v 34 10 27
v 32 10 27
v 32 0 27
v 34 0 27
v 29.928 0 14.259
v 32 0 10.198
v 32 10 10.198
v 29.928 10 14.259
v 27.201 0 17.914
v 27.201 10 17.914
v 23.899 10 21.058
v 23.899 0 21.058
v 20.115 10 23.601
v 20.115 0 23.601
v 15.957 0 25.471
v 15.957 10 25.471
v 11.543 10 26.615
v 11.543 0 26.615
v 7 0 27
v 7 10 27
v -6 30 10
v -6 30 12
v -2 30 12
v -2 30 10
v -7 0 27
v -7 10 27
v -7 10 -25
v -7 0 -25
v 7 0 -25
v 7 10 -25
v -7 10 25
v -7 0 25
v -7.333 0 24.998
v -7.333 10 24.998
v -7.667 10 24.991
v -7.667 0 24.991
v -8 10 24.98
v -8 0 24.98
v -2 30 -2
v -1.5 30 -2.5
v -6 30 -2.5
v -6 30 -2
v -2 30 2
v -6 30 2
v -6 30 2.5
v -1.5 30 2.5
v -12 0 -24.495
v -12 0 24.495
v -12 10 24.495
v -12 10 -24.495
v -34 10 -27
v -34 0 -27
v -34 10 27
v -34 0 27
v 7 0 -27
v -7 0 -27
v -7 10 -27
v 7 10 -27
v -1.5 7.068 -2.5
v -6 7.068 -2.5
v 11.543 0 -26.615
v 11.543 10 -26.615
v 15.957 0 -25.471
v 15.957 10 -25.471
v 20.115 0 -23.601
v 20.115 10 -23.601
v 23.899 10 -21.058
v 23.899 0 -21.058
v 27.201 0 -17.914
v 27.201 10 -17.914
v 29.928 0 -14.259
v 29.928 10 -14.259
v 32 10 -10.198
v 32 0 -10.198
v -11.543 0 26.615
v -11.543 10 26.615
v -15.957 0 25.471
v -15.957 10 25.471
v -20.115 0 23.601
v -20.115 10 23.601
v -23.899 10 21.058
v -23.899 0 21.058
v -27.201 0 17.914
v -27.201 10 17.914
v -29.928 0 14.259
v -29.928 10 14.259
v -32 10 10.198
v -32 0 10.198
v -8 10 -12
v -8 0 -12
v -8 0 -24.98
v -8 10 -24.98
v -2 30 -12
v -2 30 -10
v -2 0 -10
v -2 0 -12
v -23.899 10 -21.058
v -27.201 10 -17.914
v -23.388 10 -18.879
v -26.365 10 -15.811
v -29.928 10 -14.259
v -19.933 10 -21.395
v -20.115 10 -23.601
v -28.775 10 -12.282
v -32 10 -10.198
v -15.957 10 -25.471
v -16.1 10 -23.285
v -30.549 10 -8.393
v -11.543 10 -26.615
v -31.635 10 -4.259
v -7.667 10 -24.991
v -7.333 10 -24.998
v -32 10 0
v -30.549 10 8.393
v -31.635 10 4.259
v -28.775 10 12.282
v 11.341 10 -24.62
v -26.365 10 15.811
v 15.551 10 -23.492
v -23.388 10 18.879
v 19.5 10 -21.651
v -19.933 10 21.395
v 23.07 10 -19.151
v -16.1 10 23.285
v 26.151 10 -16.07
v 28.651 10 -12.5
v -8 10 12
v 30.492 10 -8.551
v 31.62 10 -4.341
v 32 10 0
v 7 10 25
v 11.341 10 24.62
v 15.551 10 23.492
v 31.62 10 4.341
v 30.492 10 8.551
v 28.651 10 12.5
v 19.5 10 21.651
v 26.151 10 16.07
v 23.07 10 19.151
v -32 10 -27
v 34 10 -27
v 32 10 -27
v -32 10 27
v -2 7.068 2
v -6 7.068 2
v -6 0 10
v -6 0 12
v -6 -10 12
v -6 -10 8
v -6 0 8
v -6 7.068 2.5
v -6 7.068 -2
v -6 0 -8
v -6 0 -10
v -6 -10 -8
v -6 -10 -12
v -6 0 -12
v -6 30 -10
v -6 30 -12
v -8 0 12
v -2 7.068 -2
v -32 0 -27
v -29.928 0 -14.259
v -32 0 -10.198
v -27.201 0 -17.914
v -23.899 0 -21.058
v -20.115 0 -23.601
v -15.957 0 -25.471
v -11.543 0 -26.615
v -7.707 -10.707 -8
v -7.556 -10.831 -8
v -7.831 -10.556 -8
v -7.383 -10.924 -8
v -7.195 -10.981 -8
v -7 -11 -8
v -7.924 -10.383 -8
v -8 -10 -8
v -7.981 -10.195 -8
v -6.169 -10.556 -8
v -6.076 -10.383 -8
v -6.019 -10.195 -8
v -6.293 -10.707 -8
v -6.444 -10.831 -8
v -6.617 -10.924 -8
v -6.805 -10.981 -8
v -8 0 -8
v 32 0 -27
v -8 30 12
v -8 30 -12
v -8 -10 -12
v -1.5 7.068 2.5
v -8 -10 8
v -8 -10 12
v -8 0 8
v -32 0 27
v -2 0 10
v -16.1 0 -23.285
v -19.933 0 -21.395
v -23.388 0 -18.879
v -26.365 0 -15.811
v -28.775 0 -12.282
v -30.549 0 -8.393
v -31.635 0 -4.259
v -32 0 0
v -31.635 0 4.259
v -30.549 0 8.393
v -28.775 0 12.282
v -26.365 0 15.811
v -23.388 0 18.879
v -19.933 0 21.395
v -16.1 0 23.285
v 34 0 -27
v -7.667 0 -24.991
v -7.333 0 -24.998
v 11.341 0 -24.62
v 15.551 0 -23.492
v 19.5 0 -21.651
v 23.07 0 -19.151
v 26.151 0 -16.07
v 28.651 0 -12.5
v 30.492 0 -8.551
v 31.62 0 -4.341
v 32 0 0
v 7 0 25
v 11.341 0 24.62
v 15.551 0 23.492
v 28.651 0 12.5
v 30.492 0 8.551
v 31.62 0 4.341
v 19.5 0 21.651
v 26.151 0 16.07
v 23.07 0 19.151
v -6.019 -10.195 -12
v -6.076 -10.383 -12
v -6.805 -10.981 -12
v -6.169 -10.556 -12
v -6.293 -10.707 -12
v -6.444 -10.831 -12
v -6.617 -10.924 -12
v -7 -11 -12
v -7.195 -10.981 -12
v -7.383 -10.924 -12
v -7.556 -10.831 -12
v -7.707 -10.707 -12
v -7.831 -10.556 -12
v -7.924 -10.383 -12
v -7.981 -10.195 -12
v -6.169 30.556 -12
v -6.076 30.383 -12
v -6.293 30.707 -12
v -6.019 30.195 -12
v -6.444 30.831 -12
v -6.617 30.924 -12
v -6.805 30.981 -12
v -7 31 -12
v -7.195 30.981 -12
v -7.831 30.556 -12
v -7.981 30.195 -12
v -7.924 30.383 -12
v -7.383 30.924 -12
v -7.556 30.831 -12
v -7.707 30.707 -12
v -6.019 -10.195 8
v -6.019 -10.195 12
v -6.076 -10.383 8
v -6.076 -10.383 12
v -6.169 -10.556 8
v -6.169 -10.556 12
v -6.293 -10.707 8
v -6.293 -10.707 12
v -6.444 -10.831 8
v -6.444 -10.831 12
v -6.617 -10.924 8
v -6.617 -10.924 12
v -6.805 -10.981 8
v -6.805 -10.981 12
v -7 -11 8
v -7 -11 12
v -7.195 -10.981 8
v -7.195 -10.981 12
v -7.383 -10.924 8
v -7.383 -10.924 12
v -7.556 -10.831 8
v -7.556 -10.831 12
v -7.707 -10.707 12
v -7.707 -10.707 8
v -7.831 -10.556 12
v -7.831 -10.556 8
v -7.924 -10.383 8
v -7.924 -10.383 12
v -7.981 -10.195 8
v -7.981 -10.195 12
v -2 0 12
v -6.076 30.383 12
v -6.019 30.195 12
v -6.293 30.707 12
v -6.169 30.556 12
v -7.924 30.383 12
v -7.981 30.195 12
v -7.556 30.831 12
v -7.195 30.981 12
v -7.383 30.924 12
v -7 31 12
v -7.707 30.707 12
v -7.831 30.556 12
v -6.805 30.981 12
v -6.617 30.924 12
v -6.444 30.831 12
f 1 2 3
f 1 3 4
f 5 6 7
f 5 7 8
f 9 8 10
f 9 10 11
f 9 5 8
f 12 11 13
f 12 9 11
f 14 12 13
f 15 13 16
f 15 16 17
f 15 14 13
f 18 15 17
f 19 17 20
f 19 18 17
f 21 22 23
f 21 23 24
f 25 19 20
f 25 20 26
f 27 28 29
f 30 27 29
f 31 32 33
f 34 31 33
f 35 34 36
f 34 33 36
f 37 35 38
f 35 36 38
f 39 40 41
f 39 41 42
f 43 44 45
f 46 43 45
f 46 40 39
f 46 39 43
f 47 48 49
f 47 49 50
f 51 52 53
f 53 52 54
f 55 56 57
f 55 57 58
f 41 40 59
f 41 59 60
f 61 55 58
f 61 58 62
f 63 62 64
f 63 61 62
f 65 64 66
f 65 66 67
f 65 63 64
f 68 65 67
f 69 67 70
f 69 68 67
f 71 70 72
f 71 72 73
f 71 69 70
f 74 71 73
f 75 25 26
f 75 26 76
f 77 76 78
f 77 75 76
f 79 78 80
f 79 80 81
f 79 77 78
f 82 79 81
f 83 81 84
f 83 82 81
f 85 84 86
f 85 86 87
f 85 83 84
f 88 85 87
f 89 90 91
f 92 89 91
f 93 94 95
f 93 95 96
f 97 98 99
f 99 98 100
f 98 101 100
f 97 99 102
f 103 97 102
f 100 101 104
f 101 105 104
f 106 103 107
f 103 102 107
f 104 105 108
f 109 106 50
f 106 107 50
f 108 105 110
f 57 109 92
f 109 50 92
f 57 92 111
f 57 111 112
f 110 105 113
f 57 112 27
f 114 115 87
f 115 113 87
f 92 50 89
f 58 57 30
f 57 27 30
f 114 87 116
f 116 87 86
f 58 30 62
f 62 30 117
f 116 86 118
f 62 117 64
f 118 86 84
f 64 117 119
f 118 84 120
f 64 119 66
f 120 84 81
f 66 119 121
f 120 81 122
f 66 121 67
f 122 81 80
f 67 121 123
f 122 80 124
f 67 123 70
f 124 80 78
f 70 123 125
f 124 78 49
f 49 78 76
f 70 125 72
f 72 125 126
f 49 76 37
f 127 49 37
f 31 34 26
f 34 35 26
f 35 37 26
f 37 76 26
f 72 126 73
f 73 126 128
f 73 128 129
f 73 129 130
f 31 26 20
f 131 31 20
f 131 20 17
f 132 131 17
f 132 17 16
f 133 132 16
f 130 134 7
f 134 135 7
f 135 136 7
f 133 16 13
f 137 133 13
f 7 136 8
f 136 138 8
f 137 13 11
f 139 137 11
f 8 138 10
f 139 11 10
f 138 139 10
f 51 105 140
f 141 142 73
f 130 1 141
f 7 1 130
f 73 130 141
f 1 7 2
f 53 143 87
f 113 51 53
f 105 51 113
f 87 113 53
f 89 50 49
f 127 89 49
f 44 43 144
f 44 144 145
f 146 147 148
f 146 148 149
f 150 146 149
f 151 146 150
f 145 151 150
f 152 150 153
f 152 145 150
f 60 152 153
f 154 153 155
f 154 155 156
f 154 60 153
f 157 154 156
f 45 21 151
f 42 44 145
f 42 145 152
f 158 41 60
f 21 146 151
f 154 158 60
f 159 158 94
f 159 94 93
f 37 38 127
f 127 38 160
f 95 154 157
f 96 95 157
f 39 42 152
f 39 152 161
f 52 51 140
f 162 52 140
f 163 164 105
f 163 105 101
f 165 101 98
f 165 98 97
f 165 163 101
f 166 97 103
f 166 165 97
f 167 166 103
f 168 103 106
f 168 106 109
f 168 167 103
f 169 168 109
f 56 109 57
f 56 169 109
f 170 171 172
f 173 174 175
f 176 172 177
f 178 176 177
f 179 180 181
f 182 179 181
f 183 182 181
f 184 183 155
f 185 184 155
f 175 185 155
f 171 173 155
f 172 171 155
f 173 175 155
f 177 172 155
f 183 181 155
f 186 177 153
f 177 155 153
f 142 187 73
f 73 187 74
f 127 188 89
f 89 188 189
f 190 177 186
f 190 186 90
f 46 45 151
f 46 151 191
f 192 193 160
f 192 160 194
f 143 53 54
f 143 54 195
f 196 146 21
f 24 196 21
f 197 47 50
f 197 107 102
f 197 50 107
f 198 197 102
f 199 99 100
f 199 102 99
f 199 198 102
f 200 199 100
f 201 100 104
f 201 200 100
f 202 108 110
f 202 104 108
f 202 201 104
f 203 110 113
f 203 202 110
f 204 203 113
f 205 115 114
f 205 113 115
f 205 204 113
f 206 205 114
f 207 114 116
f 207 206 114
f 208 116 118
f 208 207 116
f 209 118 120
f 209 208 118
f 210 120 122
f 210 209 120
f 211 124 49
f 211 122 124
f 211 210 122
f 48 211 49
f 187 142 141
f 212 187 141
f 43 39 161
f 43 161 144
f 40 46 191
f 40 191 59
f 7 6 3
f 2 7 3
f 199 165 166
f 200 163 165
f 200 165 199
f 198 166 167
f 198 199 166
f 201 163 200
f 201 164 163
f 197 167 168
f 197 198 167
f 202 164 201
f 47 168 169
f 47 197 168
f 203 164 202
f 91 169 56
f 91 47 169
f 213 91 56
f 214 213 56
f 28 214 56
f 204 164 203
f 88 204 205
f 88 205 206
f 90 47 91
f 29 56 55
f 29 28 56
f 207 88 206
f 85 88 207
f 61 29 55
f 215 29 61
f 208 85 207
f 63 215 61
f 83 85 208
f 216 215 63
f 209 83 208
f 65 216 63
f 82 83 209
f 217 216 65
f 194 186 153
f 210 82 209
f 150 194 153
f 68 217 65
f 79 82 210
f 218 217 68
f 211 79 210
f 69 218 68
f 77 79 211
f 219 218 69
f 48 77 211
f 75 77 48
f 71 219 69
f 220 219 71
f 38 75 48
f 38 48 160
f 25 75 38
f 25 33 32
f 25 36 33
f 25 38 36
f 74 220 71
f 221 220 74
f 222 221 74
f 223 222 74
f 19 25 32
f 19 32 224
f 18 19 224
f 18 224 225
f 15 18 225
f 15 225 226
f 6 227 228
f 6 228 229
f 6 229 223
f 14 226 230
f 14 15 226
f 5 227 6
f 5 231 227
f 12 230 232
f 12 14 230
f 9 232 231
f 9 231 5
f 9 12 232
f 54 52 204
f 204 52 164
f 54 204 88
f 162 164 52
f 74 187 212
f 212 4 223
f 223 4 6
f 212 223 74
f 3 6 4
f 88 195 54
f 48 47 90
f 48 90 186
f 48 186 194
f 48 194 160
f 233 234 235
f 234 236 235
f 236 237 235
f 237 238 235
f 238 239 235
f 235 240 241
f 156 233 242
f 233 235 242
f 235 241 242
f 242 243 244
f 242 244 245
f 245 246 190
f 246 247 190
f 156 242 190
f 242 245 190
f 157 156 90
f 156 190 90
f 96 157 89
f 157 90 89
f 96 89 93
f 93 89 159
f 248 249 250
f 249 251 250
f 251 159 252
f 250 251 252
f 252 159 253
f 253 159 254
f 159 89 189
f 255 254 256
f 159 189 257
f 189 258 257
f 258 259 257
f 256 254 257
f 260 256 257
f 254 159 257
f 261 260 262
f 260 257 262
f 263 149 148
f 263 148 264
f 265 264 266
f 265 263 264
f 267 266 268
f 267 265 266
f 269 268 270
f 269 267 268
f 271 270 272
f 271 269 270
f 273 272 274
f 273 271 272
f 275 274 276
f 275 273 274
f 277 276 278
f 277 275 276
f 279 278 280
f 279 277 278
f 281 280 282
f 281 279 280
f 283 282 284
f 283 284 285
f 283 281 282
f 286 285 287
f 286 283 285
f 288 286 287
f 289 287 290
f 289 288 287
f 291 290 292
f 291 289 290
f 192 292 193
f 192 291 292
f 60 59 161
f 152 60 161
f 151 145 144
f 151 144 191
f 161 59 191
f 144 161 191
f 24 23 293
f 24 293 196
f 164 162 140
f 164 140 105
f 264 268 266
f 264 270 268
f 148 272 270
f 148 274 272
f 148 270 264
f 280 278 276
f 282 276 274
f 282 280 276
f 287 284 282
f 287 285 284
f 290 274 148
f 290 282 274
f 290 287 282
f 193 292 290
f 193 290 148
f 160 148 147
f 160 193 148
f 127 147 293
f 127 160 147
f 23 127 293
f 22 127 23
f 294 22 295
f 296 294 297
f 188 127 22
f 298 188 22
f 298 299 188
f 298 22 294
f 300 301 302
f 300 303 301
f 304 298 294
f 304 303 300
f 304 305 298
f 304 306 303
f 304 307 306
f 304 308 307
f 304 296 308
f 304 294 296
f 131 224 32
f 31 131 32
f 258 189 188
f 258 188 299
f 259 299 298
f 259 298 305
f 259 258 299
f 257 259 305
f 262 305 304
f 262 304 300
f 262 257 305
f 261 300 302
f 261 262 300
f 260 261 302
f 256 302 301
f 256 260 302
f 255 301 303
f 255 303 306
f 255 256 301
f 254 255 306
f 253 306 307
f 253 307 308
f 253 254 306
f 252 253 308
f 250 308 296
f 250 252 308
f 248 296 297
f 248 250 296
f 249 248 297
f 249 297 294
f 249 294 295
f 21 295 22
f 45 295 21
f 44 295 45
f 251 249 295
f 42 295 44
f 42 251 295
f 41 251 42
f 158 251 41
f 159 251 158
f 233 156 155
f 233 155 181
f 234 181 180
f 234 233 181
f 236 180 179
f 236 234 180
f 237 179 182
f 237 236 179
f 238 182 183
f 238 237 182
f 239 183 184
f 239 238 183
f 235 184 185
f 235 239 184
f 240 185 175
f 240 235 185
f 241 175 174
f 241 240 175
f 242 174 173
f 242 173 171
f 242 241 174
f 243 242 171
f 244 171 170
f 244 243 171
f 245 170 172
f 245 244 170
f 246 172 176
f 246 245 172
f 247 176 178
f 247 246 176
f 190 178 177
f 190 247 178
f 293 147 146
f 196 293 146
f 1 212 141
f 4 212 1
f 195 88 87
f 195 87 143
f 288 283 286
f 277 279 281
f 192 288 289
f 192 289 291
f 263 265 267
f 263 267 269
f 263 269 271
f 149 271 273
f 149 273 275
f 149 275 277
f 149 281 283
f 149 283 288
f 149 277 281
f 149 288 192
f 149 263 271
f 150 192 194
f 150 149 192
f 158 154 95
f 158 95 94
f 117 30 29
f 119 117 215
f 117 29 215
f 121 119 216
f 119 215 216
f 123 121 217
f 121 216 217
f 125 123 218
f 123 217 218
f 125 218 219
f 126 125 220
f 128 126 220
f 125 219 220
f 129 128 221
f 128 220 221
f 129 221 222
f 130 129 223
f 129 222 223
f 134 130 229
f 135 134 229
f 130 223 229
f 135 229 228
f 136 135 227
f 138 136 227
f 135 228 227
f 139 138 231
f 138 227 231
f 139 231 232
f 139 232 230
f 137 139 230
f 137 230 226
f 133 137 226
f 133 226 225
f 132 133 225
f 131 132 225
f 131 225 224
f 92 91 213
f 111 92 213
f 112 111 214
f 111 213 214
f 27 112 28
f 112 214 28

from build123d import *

# Parameters (mm, degrees)
EXTRUDE_1_DEPTH     = 10
SKETCH_9_W          = 24
SKETCH_9_H          = 40
EXTRUDE_5_DEPTH     = 2
SKETCH_10_R         = 1
EXTRUDE_6_DEPTH     = 24
SKETCH_11_W         = 16
SKETCH_11_H         = 15.152135862
CUT_EXTRUDE_2_DEPTH = 24
SKETCH_12_W         = 2
SKETCH_12_H         = 30
EXTRUDE_7_DEPTH     = 4
SKETCH_13_W         = 5
SKETCH_13_H         = 5
SKETCH_13_W_2       = 4
SKETCH_13_H_2       = 4
SKETCH_15_W         = 2
SKETCH_15_H         = 54
EXTRUDE_8_DEPTH     = 10


with BuildPart() as part:
    # 草图2 → 凸台-拉伸1 (new body)
    with BuildSketch(Plane(origin=(0, 0, 0), x_dir=(1, 0, 0), z_dir=(0, 1, 0))):
        with BuildLine():
            Line((-7, 27), (7, 27))
            ThreePointArc((7, 27), (34, 0), (7, -27))
            Line((7, -27), (-7, -27))
            ThreePointArc((-7, -27), (-34, 0), (-7, 27))
        make_face()
        with BuildLine():
            Line((-7, 25), (7, 25))
            ThreePointArc((7, 25), (32, 0), (7, -25))
            Line((7, -25), (-7, -25))
            ThreePointArc((-7, -25), (-7.50010007, -24.994997498), (-8, -24.979991994))
            Line((-8, -24.979991994), (-8, 24.979991994))
            ThreePointArc((-8, 24.979991994), (-7.50010007, 24.994997498), (-7, 25))
        make_face(mode=Mode.SUBTRACT)
        with BuildLine():
            Line((-12, -24.494897428), (-12, 24.494897428))
            ThreePointArc((-12, 24.494897428), (-32, 0), (-12, -24.494897428))
        make_face(mode=Mode.SUBTRACT)
    extrude(amount=EXTRUDE_1_DEPTH)

    # 草图9 → 凸台-拉伸5 (add)
    with BuildSketch(Plane(origin=(-8, 0, 0), x_dir=(0, 0, -1), z_dir=(1, 0, 0))):
        with Locations((0, 10)):
            Rectangle(SKETCH_9_W, SKETCH_9_H)
    extrude(amount=EXTRUDE_5_DEPTH)

    # 草图10 → 凸台-拉伸6 (add)
    with BuildSketch(Plane(origin=(0, 0, -12), x_dir=(-1, 0, 0), z_dir=(0, 0, -1))):
        with Locations((7, 30)):
            Circle(SKETCH_10_R)
        with Locations((7, -10)):
            Circle(SKETCH_10_R)
    extrude(amount=-EXTRUDE_6_DEPTH)

    # 草图11 → 切除-拉伸2 (cut)
    with BuildSketch(Plane(origin=(-6, 0, 0), x_dir=(0, 0, -1), z_dir=(1, 0, 0))):
        with Locations((0, -7.576067931)):
            Rectangle(SKETCH_11_W, SKETCH_11_H)
    extrude(amount=-CUT_EXTRUDE_2_DEPTH, mode=Mode.SUBTRACT)

    # 草图12 → 凸台-拉伸7 (add)
    with BuildSketch(Plane(origin=(-6, 0, 0), x_dir=(0, 0, -1), z_dir=(1, 0, 0))):
        with Locations((11, 15)):
            Rectangle(SKETCH_12_W, SKETCH_12_H)
        with Locations((-11, 15)):
            Rectangle(SKETCH_12_W, SKETCH_12_H)
    extrude(amount=EXTRUDE_7_DEPTH)

    # 扫描3: sweep along a path in 草图14
    with BuildLine(Plane(origin=(-6, 0, 0), x_dir=(0, 0, -1), z_dir=(1, 0, 0))) as sweep_3_path:
        Line((-2, 7.068163289), (-2, 30))
    # 草图13 → 扫描3 (sweep)
    with BuildSketch(Plane(origin=(0, 30, 0), x_dir=(1, 0, 0), z_dir=(0, 1, 0))):
        with Locations((-4, 0)):
            Rectangle(SKETCH_13_W, SKETCH_13_H)
        with Locations((-4, 0)):
            Rectangle(SKETCH_13_W_2, SKETCH_13_H_2, mode=Mode.SUBTRACT)
    sweep(path=sweep_3_path.line)

    # 草图15 → 凸台-拉伸8 (add)
    with BuildSketch(Plane.XZ):
        with Locations((-33, 0)):
            Rectangle(SKETCH_15_W, SKETCH_15_H)
        with Locations((33, 0)):
            Rectangle(SKETCH_15_W, SKETCH_15_H)
    extrude(amount=-EXTRUDE_8_DEPTH)


solid = part.part
